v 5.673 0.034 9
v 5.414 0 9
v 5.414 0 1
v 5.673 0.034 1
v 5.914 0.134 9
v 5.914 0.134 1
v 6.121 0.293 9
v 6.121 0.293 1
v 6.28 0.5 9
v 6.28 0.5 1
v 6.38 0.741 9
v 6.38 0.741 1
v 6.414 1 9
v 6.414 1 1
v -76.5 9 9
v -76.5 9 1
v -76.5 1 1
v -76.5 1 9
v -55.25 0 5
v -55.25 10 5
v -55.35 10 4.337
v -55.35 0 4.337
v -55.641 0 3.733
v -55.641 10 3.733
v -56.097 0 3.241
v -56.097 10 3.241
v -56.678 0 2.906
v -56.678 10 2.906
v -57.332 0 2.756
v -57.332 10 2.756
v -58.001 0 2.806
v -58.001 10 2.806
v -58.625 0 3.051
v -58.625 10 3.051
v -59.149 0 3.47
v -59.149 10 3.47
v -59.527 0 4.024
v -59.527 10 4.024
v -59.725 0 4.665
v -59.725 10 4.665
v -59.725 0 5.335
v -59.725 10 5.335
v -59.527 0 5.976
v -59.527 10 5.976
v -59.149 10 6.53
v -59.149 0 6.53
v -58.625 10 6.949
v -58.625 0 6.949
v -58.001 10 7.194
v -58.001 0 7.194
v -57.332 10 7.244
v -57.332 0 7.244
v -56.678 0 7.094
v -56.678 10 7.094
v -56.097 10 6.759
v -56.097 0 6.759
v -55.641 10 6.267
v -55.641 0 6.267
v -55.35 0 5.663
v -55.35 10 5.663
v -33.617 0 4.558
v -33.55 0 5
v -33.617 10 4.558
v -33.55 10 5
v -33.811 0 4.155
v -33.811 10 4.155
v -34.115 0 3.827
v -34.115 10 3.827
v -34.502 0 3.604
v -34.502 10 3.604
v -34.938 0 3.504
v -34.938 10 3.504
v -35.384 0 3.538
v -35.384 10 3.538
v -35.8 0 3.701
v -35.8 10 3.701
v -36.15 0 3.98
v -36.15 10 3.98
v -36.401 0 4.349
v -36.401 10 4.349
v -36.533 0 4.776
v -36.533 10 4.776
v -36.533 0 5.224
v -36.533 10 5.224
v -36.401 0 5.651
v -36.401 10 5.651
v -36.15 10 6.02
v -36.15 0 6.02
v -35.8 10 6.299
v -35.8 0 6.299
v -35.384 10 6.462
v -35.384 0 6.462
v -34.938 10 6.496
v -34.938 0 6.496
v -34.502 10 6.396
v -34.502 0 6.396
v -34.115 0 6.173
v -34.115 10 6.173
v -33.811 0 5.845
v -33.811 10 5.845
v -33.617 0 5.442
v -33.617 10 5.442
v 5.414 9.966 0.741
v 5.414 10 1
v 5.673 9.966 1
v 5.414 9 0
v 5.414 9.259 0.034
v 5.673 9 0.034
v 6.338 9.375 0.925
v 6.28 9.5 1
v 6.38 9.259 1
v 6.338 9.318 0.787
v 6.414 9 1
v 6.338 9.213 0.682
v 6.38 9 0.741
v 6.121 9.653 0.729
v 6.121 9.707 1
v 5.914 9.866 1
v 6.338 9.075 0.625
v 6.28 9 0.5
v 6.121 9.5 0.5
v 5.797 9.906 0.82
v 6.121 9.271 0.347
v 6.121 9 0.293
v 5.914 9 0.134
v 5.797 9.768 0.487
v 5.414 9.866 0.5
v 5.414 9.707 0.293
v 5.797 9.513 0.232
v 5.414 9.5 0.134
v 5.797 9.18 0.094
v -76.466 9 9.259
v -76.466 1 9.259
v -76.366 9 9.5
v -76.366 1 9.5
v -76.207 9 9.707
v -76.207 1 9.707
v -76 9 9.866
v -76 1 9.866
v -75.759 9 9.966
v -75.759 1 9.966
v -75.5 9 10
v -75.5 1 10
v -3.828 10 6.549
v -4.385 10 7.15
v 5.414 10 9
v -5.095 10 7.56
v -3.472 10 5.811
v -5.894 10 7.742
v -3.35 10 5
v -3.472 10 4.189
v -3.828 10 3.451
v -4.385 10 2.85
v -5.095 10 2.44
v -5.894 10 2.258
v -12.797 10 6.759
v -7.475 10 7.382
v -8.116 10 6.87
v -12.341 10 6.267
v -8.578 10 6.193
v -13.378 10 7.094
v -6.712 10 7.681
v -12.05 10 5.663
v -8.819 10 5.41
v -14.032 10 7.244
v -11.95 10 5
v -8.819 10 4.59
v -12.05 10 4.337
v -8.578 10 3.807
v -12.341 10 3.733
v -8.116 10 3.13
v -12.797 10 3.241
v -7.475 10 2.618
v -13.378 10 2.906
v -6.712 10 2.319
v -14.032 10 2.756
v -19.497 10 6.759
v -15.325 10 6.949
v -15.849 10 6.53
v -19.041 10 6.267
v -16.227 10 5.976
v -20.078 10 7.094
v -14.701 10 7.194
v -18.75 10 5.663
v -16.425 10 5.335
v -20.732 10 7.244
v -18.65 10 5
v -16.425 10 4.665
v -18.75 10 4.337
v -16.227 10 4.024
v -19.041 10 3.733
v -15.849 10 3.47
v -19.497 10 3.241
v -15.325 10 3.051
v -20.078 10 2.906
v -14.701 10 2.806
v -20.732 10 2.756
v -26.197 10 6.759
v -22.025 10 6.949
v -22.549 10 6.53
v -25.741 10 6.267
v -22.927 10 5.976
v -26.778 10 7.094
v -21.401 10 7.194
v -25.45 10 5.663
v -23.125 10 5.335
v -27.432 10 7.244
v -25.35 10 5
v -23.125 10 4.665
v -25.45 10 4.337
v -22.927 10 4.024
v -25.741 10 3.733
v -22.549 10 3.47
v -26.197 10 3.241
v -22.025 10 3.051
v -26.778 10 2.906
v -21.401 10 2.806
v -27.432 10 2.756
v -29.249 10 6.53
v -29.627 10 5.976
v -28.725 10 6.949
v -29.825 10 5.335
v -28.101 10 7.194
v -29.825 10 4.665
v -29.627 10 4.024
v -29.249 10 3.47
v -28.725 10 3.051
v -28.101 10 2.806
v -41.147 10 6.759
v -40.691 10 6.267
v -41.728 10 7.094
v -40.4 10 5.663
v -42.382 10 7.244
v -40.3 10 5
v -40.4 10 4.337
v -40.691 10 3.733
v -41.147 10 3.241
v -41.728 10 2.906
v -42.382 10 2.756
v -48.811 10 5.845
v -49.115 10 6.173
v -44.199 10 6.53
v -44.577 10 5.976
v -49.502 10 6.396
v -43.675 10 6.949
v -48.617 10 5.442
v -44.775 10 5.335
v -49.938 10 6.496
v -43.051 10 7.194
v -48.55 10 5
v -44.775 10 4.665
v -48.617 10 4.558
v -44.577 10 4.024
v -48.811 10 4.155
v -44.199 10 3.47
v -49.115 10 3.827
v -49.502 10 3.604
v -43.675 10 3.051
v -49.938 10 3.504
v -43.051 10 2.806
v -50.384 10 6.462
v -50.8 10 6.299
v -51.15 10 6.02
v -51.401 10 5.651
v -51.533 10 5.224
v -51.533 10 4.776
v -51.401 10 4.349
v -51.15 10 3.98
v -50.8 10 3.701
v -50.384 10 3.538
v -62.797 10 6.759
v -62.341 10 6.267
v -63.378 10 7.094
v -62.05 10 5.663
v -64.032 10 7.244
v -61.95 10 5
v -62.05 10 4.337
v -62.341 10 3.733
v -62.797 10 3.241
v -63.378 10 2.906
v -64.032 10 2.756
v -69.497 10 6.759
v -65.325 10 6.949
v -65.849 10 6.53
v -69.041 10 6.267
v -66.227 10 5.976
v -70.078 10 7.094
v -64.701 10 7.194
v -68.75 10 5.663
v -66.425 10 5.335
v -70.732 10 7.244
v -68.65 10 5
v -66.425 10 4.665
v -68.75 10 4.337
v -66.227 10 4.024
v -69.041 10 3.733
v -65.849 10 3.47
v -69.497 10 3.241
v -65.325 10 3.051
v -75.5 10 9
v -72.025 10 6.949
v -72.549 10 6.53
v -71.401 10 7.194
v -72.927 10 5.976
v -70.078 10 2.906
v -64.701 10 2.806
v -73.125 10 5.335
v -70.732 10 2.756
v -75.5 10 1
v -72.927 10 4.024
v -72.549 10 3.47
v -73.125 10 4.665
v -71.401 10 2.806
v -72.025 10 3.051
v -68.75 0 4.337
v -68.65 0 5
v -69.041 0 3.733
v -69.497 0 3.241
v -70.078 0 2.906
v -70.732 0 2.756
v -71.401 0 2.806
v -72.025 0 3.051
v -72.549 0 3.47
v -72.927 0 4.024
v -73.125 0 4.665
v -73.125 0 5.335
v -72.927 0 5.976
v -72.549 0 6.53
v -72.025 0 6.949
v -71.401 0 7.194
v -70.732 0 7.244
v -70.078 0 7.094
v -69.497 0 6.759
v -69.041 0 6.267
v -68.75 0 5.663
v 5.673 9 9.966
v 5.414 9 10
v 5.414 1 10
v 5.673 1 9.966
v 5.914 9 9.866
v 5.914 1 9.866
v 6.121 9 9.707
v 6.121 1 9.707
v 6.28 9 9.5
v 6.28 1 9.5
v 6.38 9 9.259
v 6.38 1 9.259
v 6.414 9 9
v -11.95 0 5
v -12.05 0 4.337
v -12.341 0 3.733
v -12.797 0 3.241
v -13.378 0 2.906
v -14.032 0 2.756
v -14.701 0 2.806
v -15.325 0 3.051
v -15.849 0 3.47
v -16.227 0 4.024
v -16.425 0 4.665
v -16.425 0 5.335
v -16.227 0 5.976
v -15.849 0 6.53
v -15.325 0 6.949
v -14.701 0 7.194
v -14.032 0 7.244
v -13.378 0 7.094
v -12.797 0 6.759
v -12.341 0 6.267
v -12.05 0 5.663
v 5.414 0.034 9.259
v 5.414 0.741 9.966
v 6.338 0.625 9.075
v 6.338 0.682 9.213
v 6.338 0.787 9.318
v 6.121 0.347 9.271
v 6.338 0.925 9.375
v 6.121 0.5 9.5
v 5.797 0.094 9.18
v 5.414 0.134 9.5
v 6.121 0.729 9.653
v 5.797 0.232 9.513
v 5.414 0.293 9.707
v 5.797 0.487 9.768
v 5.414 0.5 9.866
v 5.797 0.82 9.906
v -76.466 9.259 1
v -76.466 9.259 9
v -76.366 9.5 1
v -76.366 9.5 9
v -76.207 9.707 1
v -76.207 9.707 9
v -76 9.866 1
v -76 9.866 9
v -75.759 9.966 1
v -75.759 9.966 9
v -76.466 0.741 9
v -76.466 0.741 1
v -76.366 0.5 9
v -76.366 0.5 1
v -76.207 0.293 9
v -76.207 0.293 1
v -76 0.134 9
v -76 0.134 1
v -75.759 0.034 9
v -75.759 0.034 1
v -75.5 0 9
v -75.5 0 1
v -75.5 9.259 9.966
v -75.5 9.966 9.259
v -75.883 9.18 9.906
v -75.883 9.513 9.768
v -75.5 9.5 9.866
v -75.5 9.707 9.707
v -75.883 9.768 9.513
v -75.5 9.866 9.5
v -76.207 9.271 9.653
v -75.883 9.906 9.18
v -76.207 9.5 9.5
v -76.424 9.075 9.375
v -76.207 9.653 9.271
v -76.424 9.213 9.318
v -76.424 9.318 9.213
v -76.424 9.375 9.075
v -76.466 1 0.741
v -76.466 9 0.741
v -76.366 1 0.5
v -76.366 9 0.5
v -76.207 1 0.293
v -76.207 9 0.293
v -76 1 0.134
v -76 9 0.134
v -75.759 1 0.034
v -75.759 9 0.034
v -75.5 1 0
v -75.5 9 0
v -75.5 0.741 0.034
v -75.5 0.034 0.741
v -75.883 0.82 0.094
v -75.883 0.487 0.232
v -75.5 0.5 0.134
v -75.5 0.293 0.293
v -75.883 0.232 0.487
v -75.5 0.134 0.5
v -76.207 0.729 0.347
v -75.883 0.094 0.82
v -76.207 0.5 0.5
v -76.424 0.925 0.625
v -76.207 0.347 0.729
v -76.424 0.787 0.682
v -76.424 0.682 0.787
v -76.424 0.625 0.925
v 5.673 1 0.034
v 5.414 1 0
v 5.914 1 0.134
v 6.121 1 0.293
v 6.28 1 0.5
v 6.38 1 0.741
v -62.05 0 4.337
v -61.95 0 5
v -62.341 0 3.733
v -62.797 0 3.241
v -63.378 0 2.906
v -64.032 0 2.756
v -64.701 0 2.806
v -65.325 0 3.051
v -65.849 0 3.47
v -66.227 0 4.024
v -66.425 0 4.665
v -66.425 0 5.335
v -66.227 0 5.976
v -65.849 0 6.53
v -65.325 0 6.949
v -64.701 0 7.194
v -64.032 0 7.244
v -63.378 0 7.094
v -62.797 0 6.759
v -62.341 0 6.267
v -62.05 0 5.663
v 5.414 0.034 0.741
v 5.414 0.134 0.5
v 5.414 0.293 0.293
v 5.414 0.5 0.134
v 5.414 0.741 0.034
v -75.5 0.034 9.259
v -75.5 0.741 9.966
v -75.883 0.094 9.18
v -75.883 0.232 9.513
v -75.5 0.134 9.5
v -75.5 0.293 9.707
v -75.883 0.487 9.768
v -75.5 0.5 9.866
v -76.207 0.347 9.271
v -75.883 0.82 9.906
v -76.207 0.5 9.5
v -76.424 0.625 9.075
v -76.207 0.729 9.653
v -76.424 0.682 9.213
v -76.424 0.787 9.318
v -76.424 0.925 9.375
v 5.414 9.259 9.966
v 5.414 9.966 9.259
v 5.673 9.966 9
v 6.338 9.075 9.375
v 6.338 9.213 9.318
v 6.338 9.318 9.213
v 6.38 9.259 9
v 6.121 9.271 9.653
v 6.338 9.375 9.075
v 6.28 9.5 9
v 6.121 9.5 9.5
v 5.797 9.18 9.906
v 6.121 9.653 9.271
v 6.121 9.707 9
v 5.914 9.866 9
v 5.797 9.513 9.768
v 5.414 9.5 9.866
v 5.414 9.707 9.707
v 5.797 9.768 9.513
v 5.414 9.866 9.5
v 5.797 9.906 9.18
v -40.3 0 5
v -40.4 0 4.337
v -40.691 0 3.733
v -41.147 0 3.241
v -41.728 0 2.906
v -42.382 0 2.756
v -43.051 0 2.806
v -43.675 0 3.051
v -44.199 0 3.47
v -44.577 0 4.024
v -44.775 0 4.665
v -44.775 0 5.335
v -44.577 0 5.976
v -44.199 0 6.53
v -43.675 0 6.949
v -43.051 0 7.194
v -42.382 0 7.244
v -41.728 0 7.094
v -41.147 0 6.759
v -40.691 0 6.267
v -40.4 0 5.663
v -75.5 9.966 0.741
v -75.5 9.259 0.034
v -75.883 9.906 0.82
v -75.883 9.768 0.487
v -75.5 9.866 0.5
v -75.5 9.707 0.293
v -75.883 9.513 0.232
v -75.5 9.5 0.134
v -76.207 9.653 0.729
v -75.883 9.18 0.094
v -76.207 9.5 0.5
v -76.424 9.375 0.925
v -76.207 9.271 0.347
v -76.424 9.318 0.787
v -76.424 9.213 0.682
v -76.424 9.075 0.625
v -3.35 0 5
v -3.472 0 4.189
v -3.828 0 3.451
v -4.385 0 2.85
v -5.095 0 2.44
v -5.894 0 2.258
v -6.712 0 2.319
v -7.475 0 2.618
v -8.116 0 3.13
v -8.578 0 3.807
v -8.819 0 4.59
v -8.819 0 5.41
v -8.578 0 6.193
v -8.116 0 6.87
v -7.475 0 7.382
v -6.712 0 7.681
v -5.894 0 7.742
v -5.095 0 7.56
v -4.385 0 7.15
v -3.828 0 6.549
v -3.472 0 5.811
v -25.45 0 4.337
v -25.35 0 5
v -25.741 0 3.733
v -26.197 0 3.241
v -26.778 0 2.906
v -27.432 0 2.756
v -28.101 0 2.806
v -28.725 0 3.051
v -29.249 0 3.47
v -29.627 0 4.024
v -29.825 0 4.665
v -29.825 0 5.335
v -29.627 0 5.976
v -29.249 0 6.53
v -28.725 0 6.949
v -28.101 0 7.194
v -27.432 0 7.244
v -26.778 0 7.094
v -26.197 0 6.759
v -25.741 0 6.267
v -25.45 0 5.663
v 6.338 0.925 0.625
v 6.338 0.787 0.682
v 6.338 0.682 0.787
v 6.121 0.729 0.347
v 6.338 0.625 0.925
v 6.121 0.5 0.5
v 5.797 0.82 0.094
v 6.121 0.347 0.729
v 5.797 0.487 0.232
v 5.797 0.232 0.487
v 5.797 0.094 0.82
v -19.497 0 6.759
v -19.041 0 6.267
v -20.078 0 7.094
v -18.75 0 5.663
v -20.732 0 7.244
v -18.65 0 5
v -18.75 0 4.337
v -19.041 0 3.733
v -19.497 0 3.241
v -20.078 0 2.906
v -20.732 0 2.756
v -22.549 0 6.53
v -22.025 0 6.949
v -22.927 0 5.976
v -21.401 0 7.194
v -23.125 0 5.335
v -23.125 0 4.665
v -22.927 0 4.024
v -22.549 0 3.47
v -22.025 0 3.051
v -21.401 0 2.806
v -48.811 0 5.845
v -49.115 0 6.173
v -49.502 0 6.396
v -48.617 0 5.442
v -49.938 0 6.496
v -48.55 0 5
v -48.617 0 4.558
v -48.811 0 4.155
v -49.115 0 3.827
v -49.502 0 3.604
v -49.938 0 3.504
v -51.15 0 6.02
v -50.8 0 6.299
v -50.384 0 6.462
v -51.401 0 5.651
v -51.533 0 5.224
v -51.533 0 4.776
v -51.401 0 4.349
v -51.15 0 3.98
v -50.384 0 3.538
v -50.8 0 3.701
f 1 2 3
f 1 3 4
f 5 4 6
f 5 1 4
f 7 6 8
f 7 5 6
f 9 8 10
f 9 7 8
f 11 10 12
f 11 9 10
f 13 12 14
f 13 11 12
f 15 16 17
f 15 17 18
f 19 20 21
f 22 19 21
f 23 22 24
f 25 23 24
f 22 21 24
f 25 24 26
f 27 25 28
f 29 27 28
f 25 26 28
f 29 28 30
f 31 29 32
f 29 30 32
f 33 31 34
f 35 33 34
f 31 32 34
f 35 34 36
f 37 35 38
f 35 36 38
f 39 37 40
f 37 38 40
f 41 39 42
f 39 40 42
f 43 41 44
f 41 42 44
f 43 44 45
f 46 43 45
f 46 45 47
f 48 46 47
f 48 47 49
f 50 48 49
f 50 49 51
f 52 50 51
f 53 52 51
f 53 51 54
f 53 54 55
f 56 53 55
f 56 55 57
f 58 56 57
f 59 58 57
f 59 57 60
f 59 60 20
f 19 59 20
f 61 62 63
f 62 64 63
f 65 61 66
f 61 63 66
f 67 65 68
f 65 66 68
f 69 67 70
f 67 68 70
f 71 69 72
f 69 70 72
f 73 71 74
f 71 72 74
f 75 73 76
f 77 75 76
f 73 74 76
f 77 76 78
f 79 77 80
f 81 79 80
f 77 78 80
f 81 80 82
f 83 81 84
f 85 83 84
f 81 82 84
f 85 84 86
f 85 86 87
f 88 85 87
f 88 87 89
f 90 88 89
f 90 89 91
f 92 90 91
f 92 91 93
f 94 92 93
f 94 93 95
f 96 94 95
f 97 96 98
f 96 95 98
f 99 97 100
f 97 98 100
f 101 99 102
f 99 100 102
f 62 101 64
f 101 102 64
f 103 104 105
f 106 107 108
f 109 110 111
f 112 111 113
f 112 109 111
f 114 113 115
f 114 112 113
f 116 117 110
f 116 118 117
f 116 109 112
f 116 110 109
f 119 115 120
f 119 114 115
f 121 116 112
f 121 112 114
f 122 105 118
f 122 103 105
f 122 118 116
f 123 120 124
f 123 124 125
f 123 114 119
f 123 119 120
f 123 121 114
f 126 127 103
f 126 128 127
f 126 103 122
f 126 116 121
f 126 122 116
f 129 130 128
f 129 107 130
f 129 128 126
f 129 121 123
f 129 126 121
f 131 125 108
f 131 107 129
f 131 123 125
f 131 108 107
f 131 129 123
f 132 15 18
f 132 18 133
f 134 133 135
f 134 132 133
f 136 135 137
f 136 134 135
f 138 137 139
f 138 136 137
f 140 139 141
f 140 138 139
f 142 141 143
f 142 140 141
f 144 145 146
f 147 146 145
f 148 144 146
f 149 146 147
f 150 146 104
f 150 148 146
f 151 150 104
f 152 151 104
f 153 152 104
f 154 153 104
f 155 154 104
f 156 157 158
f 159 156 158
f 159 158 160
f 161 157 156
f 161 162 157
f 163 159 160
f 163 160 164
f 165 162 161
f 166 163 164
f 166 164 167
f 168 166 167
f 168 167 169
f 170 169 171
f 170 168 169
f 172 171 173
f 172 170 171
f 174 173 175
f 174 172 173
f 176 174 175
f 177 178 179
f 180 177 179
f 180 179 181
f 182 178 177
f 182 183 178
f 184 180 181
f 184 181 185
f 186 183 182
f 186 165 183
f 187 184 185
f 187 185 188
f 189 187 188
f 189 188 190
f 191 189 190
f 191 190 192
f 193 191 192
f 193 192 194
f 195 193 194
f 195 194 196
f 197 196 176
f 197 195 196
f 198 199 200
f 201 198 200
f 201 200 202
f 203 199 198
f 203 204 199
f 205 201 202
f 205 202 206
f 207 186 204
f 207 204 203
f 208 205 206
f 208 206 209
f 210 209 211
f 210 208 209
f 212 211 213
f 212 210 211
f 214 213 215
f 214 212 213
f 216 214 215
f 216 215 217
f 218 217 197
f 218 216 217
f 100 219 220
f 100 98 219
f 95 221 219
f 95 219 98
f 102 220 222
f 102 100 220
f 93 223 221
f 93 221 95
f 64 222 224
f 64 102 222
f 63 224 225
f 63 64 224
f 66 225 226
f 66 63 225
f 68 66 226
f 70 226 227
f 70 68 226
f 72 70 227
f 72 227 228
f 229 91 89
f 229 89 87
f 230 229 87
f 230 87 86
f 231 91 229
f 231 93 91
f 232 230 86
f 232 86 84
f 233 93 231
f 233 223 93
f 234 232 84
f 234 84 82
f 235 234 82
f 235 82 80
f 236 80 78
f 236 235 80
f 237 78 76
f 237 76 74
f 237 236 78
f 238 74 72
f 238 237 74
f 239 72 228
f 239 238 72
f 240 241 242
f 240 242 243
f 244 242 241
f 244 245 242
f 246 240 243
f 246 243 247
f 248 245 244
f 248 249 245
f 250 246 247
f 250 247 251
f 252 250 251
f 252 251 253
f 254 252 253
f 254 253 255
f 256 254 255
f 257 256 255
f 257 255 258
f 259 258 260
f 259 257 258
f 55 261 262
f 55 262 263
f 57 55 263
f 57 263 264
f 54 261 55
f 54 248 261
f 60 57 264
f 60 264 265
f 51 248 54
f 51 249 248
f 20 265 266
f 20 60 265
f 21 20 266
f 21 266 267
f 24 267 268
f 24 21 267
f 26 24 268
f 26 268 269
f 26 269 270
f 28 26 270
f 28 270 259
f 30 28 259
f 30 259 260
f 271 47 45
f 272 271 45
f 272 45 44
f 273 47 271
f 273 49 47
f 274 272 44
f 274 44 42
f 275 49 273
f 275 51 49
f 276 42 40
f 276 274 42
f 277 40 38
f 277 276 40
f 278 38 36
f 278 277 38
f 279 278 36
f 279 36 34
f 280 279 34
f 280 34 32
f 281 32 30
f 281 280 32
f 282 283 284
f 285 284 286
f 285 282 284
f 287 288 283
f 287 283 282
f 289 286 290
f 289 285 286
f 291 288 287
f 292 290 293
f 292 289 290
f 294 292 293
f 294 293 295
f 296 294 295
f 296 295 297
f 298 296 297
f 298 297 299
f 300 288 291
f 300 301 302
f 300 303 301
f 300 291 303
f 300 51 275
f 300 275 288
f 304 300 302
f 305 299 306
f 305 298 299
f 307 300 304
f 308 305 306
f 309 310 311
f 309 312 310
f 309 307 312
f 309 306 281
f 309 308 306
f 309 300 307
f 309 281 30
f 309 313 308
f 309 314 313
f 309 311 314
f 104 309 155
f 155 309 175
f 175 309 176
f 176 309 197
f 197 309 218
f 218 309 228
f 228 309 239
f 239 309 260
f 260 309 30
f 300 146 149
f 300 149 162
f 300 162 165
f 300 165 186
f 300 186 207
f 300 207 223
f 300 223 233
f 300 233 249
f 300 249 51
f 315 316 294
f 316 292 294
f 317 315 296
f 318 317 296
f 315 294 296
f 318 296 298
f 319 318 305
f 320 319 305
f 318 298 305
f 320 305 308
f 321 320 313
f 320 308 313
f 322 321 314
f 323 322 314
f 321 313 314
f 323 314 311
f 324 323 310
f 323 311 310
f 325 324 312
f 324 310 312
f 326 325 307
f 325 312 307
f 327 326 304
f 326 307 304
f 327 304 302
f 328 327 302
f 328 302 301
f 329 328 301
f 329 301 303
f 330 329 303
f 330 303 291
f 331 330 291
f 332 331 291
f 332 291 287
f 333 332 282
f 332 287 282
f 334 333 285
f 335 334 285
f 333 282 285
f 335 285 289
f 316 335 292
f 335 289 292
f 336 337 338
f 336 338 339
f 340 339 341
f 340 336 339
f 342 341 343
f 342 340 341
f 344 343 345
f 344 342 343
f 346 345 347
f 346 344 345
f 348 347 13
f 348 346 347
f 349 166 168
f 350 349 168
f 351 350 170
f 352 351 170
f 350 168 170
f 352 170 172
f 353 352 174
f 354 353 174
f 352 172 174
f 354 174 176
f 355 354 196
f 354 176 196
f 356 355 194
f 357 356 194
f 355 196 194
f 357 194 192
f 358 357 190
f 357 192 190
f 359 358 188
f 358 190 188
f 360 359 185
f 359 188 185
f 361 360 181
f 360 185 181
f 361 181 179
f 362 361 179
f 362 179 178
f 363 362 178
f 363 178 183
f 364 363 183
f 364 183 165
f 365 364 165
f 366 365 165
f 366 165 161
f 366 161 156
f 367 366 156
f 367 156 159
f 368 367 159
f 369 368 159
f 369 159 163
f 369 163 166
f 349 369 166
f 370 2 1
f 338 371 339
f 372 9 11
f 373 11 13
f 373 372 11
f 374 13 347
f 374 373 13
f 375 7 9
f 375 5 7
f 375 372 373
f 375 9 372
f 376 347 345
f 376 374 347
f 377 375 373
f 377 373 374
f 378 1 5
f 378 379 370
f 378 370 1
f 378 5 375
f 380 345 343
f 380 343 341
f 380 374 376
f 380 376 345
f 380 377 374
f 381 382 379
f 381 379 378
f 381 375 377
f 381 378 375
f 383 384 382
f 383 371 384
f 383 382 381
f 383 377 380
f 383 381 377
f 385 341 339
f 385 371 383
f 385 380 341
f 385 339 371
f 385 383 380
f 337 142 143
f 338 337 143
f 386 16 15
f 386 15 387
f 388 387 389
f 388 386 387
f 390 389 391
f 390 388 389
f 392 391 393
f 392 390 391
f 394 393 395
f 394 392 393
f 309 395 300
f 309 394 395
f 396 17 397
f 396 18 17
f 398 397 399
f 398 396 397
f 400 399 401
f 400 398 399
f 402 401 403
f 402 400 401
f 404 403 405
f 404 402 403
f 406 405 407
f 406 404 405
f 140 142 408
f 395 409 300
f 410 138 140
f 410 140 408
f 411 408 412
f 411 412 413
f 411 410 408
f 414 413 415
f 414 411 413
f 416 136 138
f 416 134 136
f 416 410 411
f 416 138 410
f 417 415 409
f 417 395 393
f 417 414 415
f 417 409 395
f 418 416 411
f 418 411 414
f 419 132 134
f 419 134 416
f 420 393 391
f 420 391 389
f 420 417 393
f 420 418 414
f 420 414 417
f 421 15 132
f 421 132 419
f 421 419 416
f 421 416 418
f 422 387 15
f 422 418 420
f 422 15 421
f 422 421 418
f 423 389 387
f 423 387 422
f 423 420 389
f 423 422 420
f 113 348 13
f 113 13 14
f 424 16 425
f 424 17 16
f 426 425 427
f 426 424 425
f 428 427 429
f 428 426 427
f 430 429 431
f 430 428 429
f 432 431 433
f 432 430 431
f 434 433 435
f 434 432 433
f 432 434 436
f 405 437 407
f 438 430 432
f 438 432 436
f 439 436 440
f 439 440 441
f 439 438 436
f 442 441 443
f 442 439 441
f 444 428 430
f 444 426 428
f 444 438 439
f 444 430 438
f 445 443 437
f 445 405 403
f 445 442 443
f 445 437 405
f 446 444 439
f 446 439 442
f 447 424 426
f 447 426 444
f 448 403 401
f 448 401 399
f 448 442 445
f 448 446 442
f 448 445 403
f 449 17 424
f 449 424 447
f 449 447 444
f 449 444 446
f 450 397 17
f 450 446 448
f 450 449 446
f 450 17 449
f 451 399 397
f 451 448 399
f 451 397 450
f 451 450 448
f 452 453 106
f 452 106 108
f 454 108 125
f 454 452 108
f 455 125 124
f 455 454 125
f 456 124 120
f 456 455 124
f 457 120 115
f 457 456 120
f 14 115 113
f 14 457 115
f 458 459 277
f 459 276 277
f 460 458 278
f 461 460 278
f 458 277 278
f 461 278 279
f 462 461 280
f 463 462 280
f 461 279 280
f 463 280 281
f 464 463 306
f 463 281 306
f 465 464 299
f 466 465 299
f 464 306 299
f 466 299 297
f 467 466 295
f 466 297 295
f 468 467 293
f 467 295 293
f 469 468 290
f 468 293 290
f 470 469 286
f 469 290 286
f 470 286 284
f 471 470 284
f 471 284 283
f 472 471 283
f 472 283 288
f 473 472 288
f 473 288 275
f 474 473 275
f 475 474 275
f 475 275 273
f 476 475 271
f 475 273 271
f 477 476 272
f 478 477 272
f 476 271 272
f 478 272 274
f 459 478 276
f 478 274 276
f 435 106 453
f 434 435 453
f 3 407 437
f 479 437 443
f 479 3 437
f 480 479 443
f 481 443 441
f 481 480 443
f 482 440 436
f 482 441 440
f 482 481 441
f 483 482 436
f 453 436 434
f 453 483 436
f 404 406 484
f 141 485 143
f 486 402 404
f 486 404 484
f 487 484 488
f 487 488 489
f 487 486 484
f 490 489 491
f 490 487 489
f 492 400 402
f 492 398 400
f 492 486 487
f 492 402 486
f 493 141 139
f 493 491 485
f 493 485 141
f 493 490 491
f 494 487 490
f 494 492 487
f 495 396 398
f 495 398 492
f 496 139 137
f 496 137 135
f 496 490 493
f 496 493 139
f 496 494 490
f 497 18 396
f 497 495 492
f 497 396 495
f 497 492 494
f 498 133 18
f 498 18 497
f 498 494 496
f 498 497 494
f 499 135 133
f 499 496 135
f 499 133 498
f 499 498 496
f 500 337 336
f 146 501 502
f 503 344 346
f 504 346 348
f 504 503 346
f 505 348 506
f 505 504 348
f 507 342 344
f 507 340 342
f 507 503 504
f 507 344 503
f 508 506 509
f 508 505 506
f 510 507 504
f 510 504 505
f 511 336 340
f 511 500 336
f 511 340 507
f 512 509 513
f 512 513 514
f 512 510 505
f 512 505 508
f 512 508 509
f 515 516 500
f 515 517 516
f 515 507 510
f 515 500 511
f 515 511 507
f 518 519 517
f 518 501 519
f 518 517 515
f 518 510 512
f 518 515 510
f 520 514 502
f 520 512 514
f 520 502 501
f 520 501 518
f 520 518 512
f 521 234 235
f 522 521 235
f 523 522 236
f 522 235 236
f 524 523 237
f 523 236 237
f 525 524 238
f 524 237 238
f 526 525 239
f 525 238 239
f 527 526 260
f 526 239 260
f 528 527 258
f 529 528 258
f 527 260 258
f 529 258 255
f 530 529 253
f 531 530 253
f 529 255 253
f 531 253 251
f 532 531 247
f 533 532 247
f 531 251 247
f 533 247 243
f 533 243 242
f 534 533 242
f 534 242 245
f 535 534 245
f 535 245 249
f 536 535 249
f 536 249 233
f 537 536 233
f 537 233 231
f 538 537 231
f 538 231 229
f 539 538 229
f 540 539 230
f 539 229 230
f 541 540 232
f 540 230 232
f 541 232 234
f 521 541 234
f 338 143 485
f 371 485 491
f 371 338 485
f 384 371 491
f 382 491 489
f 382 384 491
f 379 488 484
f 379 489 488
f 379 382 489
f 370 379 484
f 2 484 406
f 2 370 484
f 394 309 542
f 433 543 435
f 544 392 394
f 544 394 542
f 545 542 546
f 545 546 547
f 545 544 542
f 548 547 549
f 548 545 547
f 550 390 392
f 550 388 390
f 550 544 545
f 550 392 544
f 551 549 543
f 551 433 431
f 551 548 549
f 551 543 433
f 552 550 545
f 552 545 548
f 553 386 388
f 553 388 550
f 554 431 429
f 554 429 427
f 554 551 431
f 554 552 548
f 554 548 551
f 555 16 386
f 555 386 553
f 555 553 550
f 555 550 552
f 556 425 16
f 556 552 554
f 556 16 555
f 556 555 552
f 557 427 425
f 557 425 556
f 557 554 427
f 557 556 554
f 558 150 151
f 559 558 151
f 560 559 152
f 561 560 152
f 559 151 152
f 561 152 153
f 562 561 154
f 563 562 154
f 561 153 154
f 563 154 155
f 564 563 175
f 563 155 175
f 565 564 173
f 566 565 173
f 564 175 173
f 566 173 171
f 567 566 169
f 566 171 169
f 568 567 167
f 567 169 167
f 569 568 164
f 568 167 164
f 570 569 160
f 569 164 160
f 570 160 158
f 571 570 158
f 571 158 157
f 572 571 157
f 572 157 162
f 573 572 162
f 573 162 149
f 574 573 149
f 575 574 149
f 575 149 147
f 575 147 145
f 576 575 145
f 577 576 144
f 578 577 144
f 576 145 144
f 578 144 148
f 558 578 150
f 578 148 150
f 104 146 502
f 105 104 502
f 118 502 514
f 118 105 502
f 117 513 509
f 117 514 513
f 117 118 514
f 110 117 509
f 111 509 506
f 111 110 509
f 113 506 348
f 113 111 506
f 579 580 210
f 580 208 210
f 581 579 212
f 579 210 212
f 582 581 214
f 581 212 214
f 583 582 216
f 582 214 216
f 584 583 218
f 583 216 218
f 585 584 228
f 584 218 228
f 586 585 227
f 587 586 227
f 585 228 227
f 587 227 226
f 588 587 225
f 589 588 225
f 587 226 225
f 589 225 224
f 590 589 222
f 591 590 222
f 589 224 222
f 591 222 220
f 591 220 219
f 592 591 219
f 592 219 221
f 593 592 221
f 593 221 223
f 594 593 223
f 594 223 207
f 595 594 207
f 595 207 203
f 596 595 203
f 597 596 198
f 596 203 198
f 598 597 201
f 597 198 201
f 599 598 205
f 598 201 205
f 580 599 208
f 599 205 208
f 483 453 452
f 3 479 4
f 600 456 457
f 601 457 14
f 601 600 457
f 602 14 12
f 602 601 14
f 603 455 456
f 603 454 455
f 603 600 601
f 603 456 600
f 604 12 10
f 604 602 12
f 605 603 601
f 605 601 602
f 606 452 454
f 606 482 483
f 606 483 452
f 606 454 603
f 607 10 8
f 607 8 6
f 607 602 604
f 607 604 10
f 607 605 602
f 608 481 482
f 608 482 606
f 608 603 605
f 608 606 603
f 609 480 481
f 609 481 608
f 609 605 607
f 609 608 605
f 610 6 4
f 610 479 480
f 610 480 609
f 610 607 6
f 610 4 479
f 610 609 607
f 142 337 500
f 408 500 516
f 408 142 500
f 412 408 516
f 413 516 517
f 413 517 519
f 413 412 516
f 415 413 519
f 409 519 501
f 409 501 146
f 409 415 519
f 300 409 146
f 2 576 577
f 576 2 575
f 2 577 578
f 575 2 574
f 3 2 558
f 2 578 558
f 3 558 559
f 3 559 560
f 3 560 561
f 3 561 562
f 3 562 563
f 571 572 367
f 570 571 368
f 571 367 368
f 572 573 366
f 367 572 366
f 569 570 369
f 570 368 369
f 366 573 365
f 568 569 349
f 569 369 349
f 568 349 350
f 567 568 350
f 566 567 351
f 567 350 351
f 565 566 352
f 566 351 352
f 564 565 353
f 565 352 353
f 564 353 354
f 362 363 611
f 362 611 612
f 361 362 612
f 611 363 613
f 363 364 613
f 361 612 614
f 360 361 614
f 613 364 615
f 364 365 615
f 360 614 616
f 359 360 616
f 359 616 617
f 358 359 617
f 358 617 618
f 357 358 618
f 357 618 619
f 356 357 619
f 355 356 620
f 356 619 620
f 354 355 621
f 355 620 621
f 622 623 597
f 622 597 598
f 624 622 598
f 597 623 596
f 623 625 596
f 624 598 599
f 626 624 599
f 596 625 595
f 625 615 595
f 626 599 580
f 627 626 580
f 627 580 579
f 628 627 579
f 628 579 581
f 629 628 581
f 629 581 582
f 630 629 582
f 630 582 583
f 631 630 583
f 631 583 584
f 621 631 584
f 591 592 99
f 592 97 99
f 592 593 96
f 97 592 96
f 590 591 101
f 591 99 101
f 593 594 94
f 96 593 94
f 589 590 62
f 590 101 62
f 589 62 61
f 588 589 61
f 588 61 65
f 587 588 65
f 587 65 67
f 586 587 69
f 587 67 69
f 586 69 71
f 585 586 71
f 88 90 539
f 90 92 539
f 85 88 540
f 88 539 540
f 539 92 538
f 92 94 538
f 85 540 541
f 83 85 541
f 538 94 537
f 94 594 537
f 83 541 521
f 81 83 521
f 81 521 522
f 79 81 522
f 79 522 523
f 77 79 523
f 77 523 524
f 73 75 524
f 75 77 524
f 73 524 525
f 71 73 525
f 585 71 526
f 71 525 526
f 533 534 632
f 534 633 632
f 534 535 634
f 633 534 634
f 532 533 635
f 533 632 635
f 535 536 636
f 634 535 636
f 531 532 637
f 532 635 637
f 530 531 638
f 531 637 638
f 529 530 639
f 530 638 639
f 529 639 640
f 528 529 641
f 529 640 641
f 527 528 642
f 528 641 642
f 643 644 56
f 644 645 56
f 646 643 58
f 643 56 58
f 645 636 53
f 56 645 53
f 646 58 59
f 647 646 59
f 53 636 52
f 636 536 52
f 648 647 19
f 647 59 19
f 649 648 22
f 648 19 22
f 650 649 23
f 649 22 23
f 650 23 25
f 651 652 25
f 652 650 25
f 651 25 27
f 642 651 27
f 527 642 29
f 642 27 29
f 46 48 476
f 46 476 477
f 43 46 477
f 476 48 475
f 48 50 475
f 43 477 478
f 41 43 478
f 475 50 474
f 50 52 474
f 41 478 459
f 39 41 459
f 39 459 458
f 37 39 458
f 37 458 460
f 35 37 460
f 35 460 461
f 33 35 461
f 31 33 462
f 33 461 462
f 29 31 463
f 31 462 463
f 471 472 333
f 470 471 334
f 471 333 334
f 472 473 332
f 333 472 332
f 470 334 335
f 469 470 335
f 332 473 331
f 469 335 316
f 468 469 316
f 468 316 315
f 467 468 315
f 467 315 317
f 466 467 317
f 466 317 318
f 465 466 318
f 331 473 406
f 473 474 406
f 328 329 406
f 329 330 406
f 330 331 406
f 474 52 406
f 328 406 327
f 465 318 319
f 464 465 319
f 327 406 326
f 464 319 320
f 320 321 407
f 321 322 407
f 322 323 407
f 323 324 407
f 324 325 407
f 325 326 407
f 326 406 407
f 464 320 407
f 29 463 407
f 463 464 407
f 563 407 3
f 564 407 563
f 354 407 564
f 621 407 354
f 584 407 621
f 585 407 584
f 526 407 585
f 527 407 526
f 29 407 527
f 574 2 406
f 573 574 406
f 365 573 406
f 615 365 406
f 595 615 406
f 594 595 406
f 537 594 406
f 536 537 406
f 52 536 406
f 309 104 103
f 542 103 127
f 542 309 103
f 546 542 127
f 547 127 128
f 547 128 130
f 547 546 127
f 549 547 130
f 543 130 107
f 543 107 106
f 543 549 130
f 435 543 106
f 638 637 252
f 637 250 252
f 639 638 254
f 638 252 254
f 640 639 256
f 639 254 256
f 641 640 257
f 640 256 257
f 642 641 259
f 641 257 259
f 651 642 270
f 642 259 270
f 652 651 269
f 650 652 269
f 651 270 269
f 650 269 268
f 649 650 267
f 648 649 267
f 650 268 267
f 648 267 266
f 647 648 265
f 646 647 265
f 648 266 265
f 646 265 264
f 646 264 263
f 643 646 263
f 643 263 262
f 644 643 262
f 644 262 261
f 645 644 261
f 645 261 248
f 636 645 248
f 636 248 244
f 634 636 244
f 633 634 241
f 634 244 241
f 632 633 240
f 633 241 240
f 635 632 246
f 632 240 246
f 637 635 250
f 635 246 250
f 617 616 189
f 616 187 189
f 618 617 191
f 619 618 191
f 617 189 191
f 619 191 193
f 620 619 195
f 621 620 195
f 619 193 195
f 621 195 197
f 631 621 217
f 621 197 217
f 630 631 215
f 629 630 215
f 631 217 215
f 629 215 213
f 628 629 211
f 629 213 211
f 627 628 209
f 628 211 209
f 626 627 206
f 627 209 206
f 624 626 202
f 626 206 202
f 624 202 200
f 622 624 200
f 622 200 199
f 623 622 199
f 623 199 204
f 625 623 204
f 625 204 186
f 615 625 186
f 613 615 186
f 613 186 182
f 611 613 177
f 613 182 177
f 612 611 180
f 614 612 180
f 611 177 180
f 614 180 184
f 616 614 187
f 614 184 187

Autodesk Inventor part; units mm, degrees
ref_plane "YZ Plane" through (0, 0, 0) normal (1, 0, 0) x (0, 1, 0)
ref_plane "XZ Plane" through (0, 0, 0) normal (0, 1, 0) x (-1, 0, 0)
ref_plane "XY Plane" through (0, 0, 0) normal (0, 0, 1) x (1, 0, 0)
sketch "Sketch1" plane through (0, 0, 0) normal (0, 1, 0) x (-1, 0, 0)
  line L0 (0, 0) -> (170, 0)
  line L1 (170, 0) -> (170, 10)
  line L2 (170, 10) -> (0, 10)
  line L3 (0, 10) -> (0, 0)
  dimension "d0" = 170
  dimension "d1" = 10
extrude "Extrusion1" add sketch "Sketch1" along normal blind 10
sketch "Sketch2" plane through (0, 10, 0) normal (0, 1, 0) x (1, 0, 0)
  line L0 (0, -10) -> (0, 0) projected
  line L1 (0, -5) -> (-2.2, -5)
  circle A0 centre (-6.1, -5) radius 3.9
  line L2 (0, 0) -> (-170, 0) projected
  line L3 (-170, -10) -> (0, -10) projected
  circle A1 centre (-75, -5) radius 1.5
  circle A2 centre (-95, -5) radius 1.5
  dimension "d4" = 2.2
  dimension "d8" = 3
  dimension "d9" = 3
extrude "Extrusion2" cut sketch "Sketch2" against normal blind 10 contours A1
extrude "Extrusion3" cut sketch "Sketch2" against normal blind 10 contours A2
extrude "Extrusion4" cut sketch "Sketch2" against normal blind 10 contours A0
sketch "Sketch3" plane through (0, 10, 0) normal (0, 1, 0) x (1, 0, 0)
  line L0 (-170, 0) -> (-170, -10) projected
  line L1 (-170, -5) -> (-10, -5)
  circle A0 centre (-6.1, -5) radius 3.9 projected
  line L2 (-165.7, -5) -> (-163.45, -5)
  circle A1 centre (-163.45, -5) radius 2.25
  circle A2 centre (-153.45, -5) radius 2.25
  circle A3 centre (-143.45, -5) radius 2.25
  circle A4 centre (-133.45, -5) radius 2.25
  circle A5 centre (-123.45, -5) radius 2.25
  circle A6 centre (-113.45, -5) radius 2.25
  circle A7 centre (-103.45, -5) radius 2.25
  circle A8 centre (-95, -5) radius 1.5 projected
  line L3 (-93.5, -5) -> (-93.5, -7.9104)
  circle A9 centre (-75, -5) radius 1.5 projected
  line L4 (-76.5, -5) -> (-76.5, -7.25)
  line L5 (-93.5, -5) -> (-76.5, -5)
  line L6 (-85, -5) -> (-93.5, -5)
  line L7 (-85, -5) -> (-76.5, -5)
  circle A10 centre (-80.75, -5) radius 2.25
  circle A11 centre (-89.25, -5) radius 2.25
  line L8 (-10, -5) -> (-12, -5)
  line L9 (-10, -5) -> (-14.3, -5)
  line L10 (-14.3, -5) -> (-16.55, -5)
  circle A12 centre (-16.55, -5) radius 2.25
  circle A13 centre (-26.55, -5) radius 2.25
  circle A14 centre (-36.55, -5) radius 2.25
  circle A15 centre (-46.55, -5) radius 2.25
  circle A16 centre (-56.55, -5) radius 2.25
  circle A17 centre (-66.55, -5) radius 2.25
  point P0 (0, 0)
  point P1 (-155.7, -5)
  point P2 (-145.7, -5)
  point P3 (-135.7, -5)
  point P4 (-125.7, -5)
  point P5 (-115.7, -5)
  point P6 (-105.7, -5)
  point P7 (-24.3, -5)
  point P8 (-34.3, -5)
  point P9 (-44.3, -5)
  point P10 (-54.3, -5)
  point P11 (-64.3, -5)
  dimension "d20" = 10
  dimension "d32" = 10
extrude "Extrusion5" cut sketch "Sketch3" against normal blind 10 contours A1 L1 | L1 A1 | L1 A12 | L1 A12 | A2 L1 | L1 A2 | A3 L1 | L1 A3 | A4 L1 | L1 A4 | A5 L1 | L1 A5 | A6 L1 | L1 A6 | A7 L1 | L1 A7 | A11 L1 | L1 A11 | A10 L1 | L1 A10 | A17 L1 | L1 A17 | A16 L1 | L1 A16 | A15 L1 | L1 A15 | A14 L1 | L1 A14 | A13 L1 | L1 A13
thread "Thread1" size "M3x0.5" class "6H" standard "ANSI Metric M Profile" full length
thread "Thread2" size "M3x0.5" class "6H" standard "ANSI Metric M Profile" full length
sketch "Sketch4" plane through (0, 10, 0) normal (0, 1, 0) x (1, 0, 0)
  circle A0 centre (-16.55, -5) radius 2.25 projected
  circle A1 centre (-16.55, -5) radius 2.25
  point P0 (0, 0)
extrude "Extrusion6" add sketch "Sketch4" against normal blind 10
sketch "Sketch5" plane through (0, 0, 10) normal (1, 0, 0) x (0, 0, -1)
  line L0 (10, 0) -> (0, 0) projected
  line L1 (0, 0) -> (0, 10) projected
  line L2 (10, 0) -> (0, 0)
  line L3 (0, 0) -> (0, 10)
  line L4 (0, 10) -> (10, 10)
  line L5 (10, 10) -> (10, 0)
extrude "Extrusion7" add sketch "Sketch5" along normal blind 10
sketch "Sketch6" plane through (10, 0, 10) normal (1, 0, 0) x (0, 0, -1)
  line L0 (0, 0) -> (10, 0) projected
  line L1 (0, 10) -> (0, 0) projected
  line L2 (10, 0) -> (0, 0)
  line L3 (0, 0) -> (0, 10)
  line L4 (0, 10) -> (10, 10)
  line L5 (10, 10) -> (10, 0)
extrude "Extrusion8" add sketch "Sketch6" along normal blind 10
sketch "Sketch7" plane through (0, 10, 0) normal (0, 1, 0) x (1, 0, 0)
  point P0 (0, 0)
fillet "Fillet3" radius 1 11 edges at (-75, 10, 10) (-75, 0, 10) (-75, 10, 0) (20, 5, 10) (20, 5, 0) (20, 0, 5) (-170, 10, 5) (-170, 5, 10) (-170, 5, 0) (-170, 0, 5) (-75, 0, 0)
fillet "Fillet4" radius 1 3 edges at (19.7071, 9.7071, 9.7071) (19.7071, 9.7071, 0.2929) (20, 10, 5)
sketch "Sketch8" plane through (19, 1, 0) normal (0, 0, -1) x (-1, 0, 0)
  point P0 (19, -1)
sketch "Sketch9" plane through (0, 10, 0) normal (0, 1, 0) x (1, 0, 0)
  circle A0 centre (-6.1, -5) radius 3.9 projected
  circle A1 centre (-6.1, -5) radius 2.5
  point P0 (0, 0)
  dimension "d53" = 5
extrude "Extrusion9" add sketch "Sketch9" against normal blind 10
sketch "Sketch10" plane through (0, 10, 0) normal (0, 1, 0) x (1, 0, 0)
  circle A0 centre (-6.1, -5) radius 2.5 projected
  line L0 (-3.6, -5) -> (1.4, -5)
  line L1 (19, -9) -> (19, -1) projected
  line L2 (1.4, -5) -> (-76.5, -5)
  circle A1 centre (-75, -5) radius 1.5 projected
  line L3 (-76.5, -5) -> (-76.5, -10.0231)
  line L4 (-76.5, -10.0231) -> (-76.5, 0)
  line L5 (-76.5, -10.0231) -> (-169.9715, -10.0231)
  line L6 (-169, -9) -> (19, -9) projected
  line L7 (-169.9715, 0) -> (-76.5, 0)
  line L8 (-169.9715, -10.0231) -> (-170.1763, -9.372)
  line L9 (-170.1763, -9.372) -> (-170.4489, -3.7164)
  line L10 (-170.4489, -3.7164) -> (-170.4593, -3.5)
  line L11 (-170.4593, -3.5) -> (-170.4593, -0.543)
  line L12 (-170.4593, -0.543) -> (-169.9715, 0)
  point P0 (0, 0)
  dimension "d56" = 5
extrude "Extrusion10" cut sketch "Sketch10" against normal blind 10 contours L3 L5 L8 L9 L10 L11 L12 L7 L4
sketch "Sketch11" plane through (0, 10, 0) normal (0, 1, 0) x (1, 0, 0)
  circle A0 centre (-75, -5) radius 1.5 projected
  circle A1 centre (-75, -5) radius 1.5
  circle A2 centre (-66.55, -5) radius 2.25 projected
  circle A3 centre (-66.55, -5) radius 2.25
  circle A4 centre (-56.55, -5) radius 2.25 projected
  circle A5 centre (-56.55, -5) radius 2.25
  circle A6 centre (-46.55, -5) radius 2.25 projected
  circle A7 centre (-46.55, -5) radius 2.25
  circle A8 centre (-36.55, -5) radius 2.25 projected
  circle A9 centre (-36.55, -5) radius 2.25
  circle A10 centre (-26.55, -5) radius 2.25 projected
  circle A11 centre (-26.55, -5) radius 2.25
  point P0 (0, 0)
  point P1 (-76.5, -5)
extrude "Extrusion11" add sketch "Sketch11" against normal blind 10
sketch "Sketch12" plane through (0, 10, 0) normal (0, 1, 0) x (1, 0, 0)
  circle A0 centre (-6.1, -5) radius 2.5 projected
  line L0 (-8.6, -5) -> (-76.5, -5)
  line L1 (-76.5, -9) -> (-76.5, -1) projected
  line L2 (-42.55, -5) -> (-27.55, -5)
  line L3 (-42.55, -5) -> (-57.55, -5)
  line L4 (-42.55, -5) -> (-50.05, -5)
  line L5 (-42.55, -5) -> (-35.05, -5)
  circle A1 centre (-50.05, -5) radius 1.5
  circle A2 centre (-35.05, -5) radius 1.5
  line L6 (-3.6, -5) -> (6.4143, -5)
  line L7 (6.4143, -5) -> (6.4143, -10.3738)
  line L8 (6.4143, -10.3738) -> (6.4143, 1.3096)
  line L9 (6.4143, 1.3096) -> (23.7189, 1.3096)
  line L10 (23.7189, 1.3096) -> (24.3802, -13.5702)
  line L11 (24.3802, -13.5702) -> (6.4143, -10.3738)
  point P0 (0, 0)
  dimension "d61" = 15
  dimension "d62" = 15
  dimension "d63" = 3
  dimension "d64" = 3
extrude "Extrusion12" cut sketch "Sketch12" against normal blind 10 contours A2 L0 | L0 A2 | A1 L0 | L0 A1 | L8 L9 L10 L11 L7
sketch "Sketch13" plane through (0, 10, 0) normal (0, 1, 0) x (1, 0, 0)
  circle A0 centre (-50.05, -5) radius 1.5 projected
  line L0 (-48.55, -5) -> (-36.55, -5)
  circle A1 centre (-35.05, -5) radius 1.5 projected
  circle A2 centre (-42.55, -5) radius 2.25
  line L1 (-51.55, -5) -> (-55.25, -5)
  line L2 (-33.55, -5) -> (-29.85, -5)
  circle A3 centre (-57.5, -5) radius 2.25
  circle A4 centre (-27.6, -5) radius 2.25
  circle A5 centre (-20.9, -5) radius 2.25
  circle A6 centre (-14.2, -5) radius 2.25
  circle A7 centre (-64.2, -5) radius 2.25
  circle A8 centre (-70.9, -5) radius 2.25
  point P0 (0, 0)
  dimension "d67" = 4.5
  dimension "d68" = 3.7
  dimension "d69" = 3.7
  dimension "d71" = 4.5
  dimension "d73" = 4.5
  dimension "d83" = 6.7
  dimension "d90" = 6.7
extrude "Extrusion13" cut sketch "Sketch13" against normal blind 10 contours A3 | A4 | A5 | A6 | A7 | A8
sketch "Sketch14" plane through (0, 10, 0) normal (0, 1, 0) x (1, 0, 0)
  circle A0 centre (-57.5, -5) radius 2.25 projected
  line L0 (-55.25, -5) -> (-29.85, -5)
  circle A1 centre (-27.6, -5) radius 2.25 projected
  circle A2 centre (-42.55, -5) radius 2.25
  point P0 (0, 0)
  dimension "d97" = 4.5
extrude "Extrusion14" cut sketch "Sketch14" against normal blind 10 contours A2 L0 | L0 A2
thread "Thread3" size "M3x0.5" class "6H" standard "ANSI Metric M Profile" full length
thread "Thread4" size "M3x0.5" class "6H" standard "ANSI Metric M Profile" full length
fillet "Fillet5" radius 1 16 edges at (-76.5, 9.7071, 9.7071) (-76.5, 5, 10) (-76.5, 0.2929, 9.7071) (-76.5, 0, 5) (-76.5, 0.2929, 0.2929) (-76.5, 5, 0) (-76.5, 9.7071, 0.2929) (-76.5, 10, 5) (6.4143, 9.7071, 0.2929) (6.4143, 5, 0) (6.4143, 0.2929, 0.2929) (6.4143, 0, 5) (6.4143, 0.2929, 9.7071) (6.4143, 5, 10) (6.4143, 9.7071, 9.7071) (6.4143, 10, 5)
sketch "Sketch15" plane through (0, 10, 0) normal (0, 1, 0) x (1, 0, 0)
  circle A0 centre (-6.1, -5) radius 2.5 projected
  circle A1 centre (-6.1, -5) radius 2.75
  point P0 (0, 0)
  dimension "d105" = 5.5
extrude "Extrusion15" cut sketch "Sketch15" against normal blind 10 contours A0 | A1
properties part number "brazo de servo el d vdd - camara"
